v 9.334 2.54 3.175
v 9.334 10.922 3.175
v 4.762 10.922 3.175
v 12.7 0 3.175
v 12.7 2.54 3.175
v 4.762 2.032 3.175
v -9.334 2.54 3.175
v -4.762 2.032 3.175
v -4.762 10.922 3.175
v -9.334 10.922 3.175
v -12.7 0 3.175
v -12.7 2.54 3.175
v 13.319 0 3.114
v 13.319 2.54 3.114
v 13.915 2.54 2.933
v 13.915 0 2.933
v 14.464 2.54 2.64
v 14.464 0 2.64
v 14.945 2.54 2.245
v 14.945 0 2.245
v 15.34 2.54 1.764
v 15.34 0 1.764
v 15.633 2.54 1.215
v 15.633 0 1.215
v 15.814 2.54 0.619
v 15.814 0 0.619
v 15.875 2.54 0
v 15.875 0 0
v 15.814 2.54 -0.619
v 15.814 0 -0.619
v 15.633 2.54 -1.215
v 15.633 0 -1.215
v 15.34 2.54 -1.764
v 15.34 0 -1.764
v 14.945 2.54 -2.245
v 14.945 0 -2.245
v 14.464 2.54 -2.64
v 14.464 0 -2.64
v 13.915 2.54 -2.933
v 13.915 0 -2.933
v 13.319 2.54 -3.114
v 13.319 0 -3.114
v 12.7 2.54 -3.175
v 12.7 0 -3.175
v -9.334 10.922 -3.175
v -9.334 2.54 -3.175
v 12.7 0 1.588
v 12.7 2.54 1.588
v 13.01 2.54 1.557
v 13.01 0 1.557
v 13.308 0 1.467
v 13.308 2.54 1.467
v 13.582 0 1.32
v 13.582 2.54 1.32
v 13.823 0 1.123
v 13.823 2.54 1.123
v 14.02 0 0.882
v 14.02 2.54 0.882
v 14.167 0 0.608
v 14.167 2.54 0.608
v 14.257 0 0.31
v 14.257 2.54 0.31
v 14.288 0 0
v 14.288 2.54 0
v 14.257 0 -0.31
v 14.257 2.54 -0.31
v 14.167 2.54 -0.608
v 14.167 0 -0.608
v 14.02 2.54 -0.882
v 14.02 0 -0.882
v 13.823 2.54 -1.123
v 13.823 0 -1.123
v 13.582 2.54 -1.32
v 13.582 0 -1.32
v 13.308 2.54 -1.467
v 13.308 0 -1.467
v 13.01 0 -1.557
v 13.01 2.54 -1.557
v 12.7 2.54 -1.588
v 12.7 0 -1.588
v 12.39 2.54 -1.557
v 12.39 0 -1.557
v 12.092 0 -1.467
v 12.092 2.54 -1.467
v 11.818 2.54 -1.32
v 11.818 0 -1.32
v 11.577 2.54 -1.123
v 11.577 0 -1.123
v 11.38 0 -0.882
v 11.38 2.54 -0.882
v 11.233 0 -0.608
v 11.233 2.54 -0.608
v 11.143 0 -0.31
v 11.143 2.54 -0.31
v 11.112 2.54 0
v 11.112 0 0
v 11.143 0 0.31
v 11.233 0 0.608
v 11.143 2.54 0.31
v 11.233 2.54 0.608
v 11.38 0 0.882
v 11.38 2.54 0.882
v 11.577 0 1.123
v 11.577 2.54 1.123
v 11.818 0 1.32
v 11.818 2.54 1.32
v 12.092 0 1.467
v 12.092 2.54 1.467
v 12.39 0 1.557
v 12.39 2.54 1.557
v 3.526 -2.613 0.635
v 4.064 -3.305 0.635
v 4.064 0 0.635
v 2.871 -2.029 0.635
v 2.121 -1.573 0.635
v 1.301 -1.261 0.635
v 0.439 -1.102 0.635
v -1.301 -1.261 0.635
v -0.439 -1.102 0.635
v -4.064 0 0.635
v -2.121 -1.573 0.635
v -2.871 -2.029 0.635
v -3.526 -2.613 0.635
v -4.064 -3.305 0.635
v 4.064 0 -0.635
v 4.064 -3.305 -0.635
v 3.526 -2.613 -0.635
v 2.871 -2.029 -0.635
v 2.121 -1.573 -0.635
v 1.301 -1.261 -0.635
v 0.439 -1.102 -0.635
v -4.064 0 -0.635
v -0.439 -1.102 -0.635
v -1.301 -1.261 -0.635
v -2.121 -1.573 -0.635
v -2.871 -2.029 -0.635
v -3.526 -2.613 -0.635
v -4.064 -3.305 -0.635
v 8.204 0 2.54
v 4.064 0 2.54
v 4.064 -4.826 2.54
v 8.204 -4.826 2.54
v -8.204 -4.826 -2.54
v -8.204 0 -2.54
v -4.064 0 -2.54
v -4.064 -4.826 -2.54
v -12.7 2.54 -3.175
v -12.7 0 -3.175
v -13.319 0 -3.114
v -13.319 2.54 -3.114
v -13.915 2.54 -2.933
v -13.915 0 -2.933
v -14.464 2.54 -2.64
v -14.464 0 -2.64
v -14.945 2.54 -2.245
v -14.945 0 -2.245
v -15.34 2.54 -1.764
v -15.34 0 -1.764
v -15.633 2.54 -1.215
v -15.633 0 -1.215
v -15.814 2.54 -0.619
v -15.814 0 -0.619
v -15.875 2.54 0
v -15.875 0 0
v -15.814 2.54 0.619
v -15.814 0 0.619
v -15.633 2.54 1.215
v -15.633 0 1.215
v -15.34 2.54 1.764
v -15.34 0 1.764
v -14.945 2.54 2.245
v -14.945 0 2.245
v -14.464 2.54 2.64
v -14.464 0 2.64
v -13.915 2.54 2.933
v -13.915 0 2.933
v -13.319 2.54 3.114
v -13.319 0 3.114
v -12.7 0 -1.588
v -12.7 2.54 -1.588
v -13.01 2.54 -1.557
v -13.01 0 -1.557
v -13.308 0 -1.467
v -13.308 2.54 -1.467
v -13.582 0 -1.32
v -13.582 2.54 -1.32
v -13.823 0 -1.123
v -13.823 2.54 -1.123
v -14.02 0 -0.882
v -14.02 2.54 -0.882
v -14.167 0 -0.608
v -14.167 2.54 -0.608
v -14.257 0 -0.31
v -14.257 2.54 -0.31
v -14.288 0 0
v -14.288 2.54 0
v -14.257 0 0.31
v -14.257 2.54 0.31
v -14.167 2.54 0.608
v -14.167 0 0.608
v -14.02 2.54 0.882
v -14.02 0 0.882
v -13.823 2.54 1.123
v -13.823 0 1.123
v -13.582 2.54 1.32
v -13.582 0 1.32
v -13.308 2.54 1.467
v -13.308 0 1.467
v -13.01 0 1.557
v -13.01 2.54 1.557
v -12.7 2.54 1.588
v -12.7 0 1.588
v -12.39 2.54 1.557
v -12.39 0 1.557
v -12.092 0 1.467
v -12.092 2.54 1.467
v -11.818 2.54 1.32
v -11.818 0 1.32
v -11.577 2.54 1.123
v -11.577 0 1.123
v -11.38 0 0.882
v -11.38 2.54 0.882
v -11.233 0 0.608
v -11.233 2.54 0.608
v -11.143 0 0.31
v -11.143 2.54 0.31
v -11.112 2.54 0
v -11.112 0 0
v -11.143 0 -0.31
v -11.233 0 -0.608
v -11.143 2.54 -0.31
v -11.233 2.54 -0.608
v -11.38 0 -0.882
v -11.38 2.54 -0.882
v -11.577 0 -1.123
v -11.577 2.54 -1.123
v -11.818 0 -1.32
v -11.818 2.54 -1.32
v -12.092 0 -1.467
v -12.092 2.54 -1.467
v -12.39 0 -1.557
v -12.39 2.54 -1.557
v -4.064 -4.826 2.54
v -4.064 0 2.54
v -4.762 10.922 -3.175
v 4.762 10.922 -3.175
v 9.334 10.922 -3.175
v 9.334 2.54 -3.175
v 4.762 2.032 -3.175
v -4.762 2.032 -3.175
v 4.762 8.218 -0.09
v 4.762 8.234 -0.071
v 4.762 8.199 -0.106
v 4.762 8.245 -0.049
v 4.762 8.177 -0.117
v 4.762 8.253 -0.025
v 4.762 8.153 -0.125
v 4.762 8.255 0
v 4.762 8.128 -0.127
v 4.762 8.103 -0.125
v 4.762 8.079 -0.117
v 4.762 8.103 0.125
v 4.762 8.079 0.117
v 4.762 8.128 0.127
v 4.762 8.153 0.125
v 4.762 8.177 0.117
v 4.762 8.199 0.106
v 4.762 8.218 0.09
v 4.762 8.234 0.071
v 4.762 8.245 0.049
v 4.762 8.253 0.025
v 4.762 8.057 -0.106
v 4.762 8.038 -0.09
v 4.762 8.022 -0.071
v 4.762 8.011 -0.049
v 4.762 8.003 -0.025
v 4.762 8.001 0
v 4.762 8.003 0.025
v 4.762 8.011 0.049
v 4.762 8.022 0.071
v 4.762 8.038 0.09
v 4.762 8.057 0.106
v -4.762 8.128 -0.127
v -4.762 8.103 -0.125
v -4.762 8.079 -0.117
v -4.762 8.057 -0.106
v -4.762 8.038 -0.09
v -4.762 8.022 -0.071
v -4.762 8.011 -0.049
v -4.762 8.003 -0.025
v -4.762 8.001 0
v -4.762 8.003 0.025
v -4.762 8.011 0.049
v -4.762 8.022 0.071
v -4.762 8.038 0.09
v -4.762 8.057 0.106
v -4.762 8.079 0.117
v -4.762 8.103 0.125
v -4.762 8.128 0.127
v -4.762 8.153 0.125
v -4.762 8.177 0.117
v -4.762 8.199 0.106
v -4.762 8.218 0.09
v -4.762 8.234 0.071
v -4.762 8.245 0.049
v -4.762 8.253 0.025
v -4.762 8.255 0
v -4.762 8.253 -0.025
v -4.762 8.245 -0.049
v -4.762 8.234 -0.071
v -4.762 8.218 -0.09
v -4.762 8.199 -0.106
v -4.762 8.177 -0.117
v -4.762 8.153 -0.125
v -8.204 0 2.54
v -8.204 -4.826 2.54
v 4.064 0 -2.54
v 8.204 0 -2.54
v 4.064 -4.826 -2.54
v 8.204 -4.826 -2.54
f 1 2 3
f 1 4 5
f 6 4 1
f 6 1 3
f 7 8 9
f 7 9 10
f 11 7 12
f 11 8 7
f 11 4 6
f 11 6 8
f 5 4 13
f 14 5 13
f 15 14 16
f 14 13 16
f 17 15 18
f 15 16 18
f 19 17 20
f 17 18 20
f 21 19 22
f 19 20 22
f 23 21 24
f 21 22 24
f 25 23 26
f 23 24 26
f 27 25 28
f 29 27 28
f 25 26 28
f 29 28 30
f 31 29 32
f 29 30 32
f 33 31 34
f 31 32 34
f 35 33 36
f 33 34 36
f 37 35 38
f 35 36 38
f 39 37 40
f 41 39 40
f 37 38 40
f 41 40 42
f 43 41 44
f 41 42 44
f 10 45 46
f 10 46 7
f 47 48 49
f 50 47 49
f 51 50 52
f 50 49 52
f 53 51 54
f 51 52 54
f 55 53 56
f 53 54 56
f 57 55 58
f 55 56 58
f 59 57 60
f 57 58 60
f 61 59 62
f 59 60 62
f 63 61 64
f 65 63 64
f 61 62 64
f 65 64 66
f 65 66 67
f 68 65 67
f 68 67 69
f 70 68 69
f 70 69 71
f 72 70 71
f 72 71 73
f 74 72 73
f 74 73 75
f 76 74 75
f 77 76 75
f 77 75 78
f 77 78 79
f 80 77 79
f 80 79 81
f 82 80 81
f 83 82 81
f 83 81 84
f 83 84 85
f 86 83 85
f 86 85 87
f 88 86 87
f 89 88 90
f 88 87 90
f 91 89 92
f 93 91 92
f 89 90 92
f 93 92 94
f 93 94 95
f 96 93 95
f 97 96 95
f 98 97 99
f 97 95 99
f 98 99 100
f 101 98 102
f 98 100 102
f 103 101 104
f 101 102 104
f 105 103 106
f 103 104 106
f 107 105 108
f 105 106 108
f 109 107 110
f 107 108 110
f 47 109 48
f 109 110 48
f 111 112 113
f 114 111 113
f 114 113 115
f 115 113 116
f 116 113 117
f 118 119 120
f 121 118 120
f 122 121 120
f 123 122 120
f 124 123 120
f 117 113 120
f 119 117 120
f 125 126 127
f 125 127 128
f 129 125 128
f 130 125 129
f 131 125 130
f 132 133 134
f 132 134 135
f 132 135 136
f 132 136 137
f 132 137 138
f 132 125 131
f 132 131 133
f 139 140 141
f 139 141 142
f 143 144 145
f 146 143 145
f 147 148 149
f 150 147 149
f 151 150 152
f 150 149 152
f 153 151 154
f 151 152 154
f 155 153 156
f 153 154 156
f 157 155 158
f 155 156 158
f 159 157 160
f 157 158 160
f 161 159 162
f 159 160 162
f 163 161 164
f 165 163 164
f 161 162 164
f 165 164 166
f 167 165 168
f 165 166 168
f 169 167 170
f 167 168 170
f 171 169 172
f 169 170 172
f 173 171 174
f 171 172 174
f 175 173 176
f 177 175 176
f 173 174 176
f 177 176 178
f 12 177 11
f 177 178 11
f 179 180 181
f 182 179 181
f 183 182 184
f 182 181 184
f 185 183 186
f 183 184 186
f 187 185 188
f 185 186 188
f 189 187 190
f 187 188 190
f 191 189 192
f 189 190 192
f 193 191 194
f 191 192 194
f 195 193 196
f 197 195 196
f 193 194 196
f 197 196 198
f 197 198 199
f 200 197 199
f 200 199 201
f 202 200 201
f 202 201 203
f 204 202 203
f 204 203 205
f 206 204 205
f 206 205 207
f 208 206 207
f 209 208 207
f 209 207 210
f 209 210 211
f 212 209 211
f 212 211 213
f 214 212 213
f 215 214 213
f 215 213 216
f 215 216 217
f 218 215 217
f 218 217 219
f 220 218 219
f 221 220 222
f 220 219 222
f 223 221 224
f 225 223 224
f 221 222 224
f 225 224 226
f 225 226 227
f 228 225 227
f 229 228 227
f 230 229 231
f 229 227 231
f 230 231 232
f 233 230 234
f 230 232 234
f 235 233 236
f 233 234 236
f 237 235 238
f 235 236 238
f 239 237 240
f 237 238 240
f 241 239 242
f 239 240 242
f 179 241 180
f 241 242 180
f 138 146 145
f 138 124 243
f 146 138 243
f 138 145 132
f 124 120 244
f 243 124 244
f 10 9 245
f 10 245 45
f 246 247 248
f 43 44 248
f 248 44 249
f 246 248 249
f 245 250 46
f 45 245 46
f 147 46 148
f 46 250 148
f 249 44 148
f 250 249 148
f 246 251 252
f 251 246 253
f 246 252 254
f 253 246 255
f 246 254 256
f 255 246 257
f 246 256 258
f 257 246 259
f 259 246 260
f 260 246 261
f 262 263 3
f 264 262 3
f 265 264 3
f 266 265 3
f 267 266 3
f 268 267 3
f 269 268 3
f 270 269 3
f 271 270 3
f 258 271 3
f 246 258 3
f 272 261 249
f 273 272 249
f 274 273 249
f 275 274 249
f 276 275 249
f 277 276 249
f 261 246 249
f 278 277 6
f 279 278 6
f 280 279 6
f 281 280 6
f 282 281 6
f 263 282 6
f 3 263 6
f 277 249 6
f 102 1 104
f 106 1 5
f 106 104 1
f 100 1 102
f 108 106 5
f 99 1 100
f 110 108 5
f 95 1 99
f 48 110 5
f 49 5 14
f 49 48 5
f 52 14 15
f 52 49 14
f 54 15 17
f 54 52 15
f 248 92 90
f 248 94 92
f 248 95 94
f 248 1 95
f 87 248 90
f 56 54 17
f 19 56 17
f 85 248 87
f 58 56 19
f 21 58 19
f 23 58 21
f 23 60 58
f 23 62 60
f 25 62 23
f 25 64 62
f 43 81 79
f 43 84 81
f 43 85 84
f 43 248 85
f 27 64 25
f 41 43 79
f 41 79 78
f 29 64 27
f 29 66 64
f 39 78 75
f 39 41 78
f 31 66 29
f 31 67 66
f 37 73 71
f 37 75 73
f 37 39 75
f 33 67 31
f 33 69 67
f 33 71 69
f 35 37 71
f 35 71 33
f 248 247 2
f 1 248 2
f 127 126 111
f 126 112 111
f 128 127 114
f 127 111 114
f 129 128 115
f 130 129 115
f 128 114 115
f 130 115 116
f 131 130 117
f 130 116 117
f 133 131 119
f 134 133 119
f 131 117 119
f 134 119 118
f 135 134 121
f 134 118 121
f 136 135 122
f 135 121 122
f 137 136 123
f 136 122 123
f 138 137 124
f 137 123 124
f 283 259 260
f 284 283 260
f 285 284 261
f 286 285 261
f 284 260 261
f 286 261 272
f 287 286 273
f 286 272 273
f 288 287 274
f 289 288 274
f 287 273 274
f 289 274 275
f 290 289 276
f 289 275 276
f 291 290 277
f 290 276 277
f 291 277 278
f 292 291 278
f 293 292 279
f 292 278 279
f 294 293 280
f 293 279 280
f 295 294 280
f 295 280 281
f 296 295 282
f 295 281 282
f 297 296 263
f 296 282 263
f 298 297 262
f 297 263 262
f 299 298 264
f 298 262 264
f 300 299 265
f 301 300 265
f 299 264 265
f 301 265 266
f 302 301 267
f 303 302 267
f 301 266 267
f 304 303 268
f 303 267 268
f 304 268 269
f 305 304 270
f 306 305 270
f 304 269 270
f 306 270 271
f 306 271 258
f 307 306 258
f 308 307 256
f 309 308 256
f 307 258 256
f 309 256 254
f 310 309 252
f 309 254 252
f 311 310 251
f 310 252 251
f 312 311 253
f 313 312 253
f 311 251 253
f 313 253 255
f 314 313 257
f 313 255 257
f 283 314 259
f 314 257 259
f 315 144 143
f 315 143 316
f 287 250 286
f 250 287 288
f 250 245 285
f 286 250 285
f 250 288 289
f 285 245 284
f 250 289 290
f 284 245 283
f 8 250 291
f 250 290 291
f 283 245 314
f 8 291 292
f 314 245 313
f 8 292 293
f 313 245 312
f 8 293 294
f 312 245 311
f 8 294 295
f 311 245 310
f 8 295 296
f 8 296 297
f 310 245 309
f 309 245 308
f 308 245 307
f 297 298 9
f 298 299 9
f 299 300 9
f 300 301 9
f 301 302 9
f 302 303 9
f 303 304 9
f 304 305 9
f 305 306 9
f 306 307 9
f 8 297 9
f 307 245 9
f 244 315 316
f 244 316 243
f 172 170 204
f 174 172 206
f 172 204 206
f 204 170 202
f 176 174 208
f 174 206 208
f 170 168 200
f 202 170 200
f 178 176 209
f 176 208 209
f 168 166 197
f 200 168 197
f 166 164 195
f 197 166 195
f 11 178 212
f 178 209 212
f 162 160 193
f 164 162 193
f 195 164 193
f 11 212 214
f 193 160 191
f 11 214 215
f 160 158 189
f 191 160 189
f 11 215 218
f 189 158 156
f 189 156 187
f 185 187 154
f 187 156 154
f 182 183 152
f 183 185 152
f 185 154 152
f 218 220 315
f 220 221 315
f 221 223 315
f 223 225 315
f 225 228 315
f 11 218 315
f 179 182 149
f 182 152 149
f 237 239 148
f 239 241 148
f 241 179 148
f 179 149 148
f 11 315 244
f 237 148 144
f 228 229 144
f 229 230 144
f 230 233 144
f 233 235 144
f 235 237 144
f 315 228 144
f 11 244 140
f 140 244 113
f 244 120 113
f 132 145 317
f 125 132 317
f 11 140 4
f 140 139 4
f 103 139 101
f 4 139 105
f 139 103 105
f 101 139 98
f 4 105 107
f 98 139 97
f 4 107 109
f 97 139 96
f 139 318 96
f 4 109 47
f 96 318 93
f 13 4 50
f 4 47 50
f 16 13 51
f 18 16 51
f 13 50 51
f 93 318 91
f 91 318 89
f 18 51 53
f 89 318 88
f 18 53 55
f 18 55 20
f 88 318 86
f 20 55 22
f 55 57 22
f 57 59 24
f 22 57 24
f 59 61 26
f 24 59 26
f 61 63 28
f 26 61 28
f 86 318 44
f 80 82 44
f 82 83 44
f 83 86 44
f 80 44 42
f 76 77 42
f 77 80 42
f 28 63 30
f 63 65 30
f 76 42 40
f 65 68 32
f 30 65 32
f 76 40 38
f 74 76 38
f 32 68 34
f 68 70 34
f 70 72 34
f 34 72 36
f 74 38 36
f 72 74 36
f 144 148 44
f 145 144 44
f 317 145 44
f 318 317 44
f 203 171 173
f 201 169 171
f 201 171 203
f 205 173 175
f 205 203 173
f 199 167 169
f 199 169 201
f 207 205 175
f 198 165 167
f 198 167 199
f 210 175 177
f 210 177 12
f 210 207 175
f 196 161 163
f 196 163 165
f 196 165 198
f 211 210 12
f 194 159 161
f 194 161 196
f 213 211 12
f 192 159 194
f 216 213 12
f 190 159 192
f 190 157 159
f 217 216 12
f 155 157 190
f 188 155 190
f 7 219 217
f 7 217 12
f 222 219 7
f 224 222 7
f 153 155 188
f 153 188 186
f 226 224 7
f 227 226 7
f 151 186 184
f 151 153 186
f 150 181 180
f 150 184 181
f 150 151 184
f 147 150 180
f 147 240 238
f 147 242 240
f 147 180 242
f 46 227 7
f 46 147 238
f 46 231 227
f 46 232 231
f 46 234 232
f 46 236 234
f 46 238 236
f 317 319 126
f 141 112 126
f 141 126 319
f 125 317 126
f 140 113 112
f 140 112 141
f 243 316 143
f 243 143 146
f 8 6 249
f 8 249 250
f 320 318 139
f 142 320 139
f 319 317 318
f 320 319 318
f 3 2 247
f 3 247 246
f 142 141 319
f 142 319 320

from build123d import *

# Parameters (mm, degrees)
BASE_EXTRUDE_DEPTH  = 2.54
SKETCH2_W           = 9.525
SKETCH2_H           = 6.35
CUT_EXTRUDE1_DEPTH  = 0.508
SKETCH3_W           = 4.572
SKETCH3_H           = 6.35
BOSS_EXTRUDE1_DEPTH = 8.382
SKETCH4_R           = 1.5875
CUT_EXTRUDE2_DEPTH  = 19.230583479
SKETCH5_W           = 4.1402
SKETCH5_H           = 5.08
BOSS_EXTRUDE2_DEPTH = 4.826
BOSS_EXTRUDE3_DEPTH = 0.635
SKETCH7_R           = 0.127
BOSS_EXTRUDE4_DEPTH = 9.525


with BuildPart() as part:
    # Sketch1 → Base-Extrude (new body)
    with BuildSketch(Plane(origin=(0, 0, 0), x_dir=(1, 0, 0), z_dir=(0, 1, 0))):
        with BuildLine():
            Line((12.7, 3.175), (-12.7, 3.175))
            ThreePointArc((-12.7, 3.175), (-15.875, 0), (-12.7, -3.175))
            Line((-12.7, -3.175), (12.7, -3.175))
            ThreePointArc((12.7, -3.175), (15.875, 0), (12.7, 3.175))
        make_face()
    extrude(amount=BASE_EXTRUDE_DEPTH)

    # Sketch2 → Cut-Extrude1 (cut)
    with BuildSketch(Plane(origin=(0, 2.54, 0), x_dir=(-1, 0, 0), z_dir=(0, 1, 0))):
        Rectangle(SKETCH2_W, SKETCH2_H)
    extrude(amount=-CUT_EXTRUDE1_DEPTH, mode=Mode.SUBTRACT)

    # Sketch3 → Boss-Extrude1 (add)
    with BuildSketch(Plane(origin=(0, 2.54, 0), x_dir=(-1, 0, 0), z_dir=(0, 1, 0))):
        with Locations((-7.0485, 0)):
            Rectangle(SKETCH3_W, SKETCH3_H)
        with Locations((7.0485, 0)):
            Rectangle(SKETCH3_W, SKETCH3_H)
    extrude(amount=BOSS_EXTRUDE1_DEPTH)

    # Sketch4 → Cut-Extrude2 (cut, through all)
    with BuildSketch(Plane(origin=(0, 2.54, 0), x_dir=(-1, 0, 0), z_dir=(0, 1, 0))):
        with Locations(Location((-12.7, 0, 0), (0, 0, 90))):
            Circle(SKETCH4_R)
        with Locations(Location((12.7, 0, 0), (0, 0, 270))):
            Circle(SKETCH4_R)
    extrude(amount=-CUT_EXTRUDE2_DEPTH, mode=Mode.SUBTRACT)

    # Sketch5 → Boss-Extrude2 (add)
    with BuildSketch(Plane.XZ):
        with Locations((6.1341, 0)):
            Rectangle(SKETCH5_W, SKETCH5_H)
        with Locations((-6.1341, 0)):
            Rectangle(SKETCH5_W, SKETCH5_H)
    extrude(amount=BOSS_EXTRUDE2_DEPTH)

    # Sketch6 → Boss-Extrude3 (add, symmetric)
    with BuildSketch(Plane.XY):
        with BuildLine():
            Line((-4.064, 0), (4.064, 0))
            Line((4.064, 0), (4.064, -3.305361967))
            ThreePointArc((4.064, -3.305361967), (0, -1.082087461), (-4.064, -3.305361967))
            Line((-4.064, -3.305361967), (-4.064, 0))
        make_face()
    extrude(amount=BOSS_EXTRUDE3_DEPTH, both=True)

    # Sketch7 → Boss-Extrude4 (add)
    with BuildSketch(Plane.ZY.offset(-4.7625)):
        with Locations(Location((0, 8.128, 0), (0, 0, 180))):
            Circle(SKETCH7_R)
    extrude(amount=BOSS_EXTRUDE4_DEPTH)


solid = part.part
